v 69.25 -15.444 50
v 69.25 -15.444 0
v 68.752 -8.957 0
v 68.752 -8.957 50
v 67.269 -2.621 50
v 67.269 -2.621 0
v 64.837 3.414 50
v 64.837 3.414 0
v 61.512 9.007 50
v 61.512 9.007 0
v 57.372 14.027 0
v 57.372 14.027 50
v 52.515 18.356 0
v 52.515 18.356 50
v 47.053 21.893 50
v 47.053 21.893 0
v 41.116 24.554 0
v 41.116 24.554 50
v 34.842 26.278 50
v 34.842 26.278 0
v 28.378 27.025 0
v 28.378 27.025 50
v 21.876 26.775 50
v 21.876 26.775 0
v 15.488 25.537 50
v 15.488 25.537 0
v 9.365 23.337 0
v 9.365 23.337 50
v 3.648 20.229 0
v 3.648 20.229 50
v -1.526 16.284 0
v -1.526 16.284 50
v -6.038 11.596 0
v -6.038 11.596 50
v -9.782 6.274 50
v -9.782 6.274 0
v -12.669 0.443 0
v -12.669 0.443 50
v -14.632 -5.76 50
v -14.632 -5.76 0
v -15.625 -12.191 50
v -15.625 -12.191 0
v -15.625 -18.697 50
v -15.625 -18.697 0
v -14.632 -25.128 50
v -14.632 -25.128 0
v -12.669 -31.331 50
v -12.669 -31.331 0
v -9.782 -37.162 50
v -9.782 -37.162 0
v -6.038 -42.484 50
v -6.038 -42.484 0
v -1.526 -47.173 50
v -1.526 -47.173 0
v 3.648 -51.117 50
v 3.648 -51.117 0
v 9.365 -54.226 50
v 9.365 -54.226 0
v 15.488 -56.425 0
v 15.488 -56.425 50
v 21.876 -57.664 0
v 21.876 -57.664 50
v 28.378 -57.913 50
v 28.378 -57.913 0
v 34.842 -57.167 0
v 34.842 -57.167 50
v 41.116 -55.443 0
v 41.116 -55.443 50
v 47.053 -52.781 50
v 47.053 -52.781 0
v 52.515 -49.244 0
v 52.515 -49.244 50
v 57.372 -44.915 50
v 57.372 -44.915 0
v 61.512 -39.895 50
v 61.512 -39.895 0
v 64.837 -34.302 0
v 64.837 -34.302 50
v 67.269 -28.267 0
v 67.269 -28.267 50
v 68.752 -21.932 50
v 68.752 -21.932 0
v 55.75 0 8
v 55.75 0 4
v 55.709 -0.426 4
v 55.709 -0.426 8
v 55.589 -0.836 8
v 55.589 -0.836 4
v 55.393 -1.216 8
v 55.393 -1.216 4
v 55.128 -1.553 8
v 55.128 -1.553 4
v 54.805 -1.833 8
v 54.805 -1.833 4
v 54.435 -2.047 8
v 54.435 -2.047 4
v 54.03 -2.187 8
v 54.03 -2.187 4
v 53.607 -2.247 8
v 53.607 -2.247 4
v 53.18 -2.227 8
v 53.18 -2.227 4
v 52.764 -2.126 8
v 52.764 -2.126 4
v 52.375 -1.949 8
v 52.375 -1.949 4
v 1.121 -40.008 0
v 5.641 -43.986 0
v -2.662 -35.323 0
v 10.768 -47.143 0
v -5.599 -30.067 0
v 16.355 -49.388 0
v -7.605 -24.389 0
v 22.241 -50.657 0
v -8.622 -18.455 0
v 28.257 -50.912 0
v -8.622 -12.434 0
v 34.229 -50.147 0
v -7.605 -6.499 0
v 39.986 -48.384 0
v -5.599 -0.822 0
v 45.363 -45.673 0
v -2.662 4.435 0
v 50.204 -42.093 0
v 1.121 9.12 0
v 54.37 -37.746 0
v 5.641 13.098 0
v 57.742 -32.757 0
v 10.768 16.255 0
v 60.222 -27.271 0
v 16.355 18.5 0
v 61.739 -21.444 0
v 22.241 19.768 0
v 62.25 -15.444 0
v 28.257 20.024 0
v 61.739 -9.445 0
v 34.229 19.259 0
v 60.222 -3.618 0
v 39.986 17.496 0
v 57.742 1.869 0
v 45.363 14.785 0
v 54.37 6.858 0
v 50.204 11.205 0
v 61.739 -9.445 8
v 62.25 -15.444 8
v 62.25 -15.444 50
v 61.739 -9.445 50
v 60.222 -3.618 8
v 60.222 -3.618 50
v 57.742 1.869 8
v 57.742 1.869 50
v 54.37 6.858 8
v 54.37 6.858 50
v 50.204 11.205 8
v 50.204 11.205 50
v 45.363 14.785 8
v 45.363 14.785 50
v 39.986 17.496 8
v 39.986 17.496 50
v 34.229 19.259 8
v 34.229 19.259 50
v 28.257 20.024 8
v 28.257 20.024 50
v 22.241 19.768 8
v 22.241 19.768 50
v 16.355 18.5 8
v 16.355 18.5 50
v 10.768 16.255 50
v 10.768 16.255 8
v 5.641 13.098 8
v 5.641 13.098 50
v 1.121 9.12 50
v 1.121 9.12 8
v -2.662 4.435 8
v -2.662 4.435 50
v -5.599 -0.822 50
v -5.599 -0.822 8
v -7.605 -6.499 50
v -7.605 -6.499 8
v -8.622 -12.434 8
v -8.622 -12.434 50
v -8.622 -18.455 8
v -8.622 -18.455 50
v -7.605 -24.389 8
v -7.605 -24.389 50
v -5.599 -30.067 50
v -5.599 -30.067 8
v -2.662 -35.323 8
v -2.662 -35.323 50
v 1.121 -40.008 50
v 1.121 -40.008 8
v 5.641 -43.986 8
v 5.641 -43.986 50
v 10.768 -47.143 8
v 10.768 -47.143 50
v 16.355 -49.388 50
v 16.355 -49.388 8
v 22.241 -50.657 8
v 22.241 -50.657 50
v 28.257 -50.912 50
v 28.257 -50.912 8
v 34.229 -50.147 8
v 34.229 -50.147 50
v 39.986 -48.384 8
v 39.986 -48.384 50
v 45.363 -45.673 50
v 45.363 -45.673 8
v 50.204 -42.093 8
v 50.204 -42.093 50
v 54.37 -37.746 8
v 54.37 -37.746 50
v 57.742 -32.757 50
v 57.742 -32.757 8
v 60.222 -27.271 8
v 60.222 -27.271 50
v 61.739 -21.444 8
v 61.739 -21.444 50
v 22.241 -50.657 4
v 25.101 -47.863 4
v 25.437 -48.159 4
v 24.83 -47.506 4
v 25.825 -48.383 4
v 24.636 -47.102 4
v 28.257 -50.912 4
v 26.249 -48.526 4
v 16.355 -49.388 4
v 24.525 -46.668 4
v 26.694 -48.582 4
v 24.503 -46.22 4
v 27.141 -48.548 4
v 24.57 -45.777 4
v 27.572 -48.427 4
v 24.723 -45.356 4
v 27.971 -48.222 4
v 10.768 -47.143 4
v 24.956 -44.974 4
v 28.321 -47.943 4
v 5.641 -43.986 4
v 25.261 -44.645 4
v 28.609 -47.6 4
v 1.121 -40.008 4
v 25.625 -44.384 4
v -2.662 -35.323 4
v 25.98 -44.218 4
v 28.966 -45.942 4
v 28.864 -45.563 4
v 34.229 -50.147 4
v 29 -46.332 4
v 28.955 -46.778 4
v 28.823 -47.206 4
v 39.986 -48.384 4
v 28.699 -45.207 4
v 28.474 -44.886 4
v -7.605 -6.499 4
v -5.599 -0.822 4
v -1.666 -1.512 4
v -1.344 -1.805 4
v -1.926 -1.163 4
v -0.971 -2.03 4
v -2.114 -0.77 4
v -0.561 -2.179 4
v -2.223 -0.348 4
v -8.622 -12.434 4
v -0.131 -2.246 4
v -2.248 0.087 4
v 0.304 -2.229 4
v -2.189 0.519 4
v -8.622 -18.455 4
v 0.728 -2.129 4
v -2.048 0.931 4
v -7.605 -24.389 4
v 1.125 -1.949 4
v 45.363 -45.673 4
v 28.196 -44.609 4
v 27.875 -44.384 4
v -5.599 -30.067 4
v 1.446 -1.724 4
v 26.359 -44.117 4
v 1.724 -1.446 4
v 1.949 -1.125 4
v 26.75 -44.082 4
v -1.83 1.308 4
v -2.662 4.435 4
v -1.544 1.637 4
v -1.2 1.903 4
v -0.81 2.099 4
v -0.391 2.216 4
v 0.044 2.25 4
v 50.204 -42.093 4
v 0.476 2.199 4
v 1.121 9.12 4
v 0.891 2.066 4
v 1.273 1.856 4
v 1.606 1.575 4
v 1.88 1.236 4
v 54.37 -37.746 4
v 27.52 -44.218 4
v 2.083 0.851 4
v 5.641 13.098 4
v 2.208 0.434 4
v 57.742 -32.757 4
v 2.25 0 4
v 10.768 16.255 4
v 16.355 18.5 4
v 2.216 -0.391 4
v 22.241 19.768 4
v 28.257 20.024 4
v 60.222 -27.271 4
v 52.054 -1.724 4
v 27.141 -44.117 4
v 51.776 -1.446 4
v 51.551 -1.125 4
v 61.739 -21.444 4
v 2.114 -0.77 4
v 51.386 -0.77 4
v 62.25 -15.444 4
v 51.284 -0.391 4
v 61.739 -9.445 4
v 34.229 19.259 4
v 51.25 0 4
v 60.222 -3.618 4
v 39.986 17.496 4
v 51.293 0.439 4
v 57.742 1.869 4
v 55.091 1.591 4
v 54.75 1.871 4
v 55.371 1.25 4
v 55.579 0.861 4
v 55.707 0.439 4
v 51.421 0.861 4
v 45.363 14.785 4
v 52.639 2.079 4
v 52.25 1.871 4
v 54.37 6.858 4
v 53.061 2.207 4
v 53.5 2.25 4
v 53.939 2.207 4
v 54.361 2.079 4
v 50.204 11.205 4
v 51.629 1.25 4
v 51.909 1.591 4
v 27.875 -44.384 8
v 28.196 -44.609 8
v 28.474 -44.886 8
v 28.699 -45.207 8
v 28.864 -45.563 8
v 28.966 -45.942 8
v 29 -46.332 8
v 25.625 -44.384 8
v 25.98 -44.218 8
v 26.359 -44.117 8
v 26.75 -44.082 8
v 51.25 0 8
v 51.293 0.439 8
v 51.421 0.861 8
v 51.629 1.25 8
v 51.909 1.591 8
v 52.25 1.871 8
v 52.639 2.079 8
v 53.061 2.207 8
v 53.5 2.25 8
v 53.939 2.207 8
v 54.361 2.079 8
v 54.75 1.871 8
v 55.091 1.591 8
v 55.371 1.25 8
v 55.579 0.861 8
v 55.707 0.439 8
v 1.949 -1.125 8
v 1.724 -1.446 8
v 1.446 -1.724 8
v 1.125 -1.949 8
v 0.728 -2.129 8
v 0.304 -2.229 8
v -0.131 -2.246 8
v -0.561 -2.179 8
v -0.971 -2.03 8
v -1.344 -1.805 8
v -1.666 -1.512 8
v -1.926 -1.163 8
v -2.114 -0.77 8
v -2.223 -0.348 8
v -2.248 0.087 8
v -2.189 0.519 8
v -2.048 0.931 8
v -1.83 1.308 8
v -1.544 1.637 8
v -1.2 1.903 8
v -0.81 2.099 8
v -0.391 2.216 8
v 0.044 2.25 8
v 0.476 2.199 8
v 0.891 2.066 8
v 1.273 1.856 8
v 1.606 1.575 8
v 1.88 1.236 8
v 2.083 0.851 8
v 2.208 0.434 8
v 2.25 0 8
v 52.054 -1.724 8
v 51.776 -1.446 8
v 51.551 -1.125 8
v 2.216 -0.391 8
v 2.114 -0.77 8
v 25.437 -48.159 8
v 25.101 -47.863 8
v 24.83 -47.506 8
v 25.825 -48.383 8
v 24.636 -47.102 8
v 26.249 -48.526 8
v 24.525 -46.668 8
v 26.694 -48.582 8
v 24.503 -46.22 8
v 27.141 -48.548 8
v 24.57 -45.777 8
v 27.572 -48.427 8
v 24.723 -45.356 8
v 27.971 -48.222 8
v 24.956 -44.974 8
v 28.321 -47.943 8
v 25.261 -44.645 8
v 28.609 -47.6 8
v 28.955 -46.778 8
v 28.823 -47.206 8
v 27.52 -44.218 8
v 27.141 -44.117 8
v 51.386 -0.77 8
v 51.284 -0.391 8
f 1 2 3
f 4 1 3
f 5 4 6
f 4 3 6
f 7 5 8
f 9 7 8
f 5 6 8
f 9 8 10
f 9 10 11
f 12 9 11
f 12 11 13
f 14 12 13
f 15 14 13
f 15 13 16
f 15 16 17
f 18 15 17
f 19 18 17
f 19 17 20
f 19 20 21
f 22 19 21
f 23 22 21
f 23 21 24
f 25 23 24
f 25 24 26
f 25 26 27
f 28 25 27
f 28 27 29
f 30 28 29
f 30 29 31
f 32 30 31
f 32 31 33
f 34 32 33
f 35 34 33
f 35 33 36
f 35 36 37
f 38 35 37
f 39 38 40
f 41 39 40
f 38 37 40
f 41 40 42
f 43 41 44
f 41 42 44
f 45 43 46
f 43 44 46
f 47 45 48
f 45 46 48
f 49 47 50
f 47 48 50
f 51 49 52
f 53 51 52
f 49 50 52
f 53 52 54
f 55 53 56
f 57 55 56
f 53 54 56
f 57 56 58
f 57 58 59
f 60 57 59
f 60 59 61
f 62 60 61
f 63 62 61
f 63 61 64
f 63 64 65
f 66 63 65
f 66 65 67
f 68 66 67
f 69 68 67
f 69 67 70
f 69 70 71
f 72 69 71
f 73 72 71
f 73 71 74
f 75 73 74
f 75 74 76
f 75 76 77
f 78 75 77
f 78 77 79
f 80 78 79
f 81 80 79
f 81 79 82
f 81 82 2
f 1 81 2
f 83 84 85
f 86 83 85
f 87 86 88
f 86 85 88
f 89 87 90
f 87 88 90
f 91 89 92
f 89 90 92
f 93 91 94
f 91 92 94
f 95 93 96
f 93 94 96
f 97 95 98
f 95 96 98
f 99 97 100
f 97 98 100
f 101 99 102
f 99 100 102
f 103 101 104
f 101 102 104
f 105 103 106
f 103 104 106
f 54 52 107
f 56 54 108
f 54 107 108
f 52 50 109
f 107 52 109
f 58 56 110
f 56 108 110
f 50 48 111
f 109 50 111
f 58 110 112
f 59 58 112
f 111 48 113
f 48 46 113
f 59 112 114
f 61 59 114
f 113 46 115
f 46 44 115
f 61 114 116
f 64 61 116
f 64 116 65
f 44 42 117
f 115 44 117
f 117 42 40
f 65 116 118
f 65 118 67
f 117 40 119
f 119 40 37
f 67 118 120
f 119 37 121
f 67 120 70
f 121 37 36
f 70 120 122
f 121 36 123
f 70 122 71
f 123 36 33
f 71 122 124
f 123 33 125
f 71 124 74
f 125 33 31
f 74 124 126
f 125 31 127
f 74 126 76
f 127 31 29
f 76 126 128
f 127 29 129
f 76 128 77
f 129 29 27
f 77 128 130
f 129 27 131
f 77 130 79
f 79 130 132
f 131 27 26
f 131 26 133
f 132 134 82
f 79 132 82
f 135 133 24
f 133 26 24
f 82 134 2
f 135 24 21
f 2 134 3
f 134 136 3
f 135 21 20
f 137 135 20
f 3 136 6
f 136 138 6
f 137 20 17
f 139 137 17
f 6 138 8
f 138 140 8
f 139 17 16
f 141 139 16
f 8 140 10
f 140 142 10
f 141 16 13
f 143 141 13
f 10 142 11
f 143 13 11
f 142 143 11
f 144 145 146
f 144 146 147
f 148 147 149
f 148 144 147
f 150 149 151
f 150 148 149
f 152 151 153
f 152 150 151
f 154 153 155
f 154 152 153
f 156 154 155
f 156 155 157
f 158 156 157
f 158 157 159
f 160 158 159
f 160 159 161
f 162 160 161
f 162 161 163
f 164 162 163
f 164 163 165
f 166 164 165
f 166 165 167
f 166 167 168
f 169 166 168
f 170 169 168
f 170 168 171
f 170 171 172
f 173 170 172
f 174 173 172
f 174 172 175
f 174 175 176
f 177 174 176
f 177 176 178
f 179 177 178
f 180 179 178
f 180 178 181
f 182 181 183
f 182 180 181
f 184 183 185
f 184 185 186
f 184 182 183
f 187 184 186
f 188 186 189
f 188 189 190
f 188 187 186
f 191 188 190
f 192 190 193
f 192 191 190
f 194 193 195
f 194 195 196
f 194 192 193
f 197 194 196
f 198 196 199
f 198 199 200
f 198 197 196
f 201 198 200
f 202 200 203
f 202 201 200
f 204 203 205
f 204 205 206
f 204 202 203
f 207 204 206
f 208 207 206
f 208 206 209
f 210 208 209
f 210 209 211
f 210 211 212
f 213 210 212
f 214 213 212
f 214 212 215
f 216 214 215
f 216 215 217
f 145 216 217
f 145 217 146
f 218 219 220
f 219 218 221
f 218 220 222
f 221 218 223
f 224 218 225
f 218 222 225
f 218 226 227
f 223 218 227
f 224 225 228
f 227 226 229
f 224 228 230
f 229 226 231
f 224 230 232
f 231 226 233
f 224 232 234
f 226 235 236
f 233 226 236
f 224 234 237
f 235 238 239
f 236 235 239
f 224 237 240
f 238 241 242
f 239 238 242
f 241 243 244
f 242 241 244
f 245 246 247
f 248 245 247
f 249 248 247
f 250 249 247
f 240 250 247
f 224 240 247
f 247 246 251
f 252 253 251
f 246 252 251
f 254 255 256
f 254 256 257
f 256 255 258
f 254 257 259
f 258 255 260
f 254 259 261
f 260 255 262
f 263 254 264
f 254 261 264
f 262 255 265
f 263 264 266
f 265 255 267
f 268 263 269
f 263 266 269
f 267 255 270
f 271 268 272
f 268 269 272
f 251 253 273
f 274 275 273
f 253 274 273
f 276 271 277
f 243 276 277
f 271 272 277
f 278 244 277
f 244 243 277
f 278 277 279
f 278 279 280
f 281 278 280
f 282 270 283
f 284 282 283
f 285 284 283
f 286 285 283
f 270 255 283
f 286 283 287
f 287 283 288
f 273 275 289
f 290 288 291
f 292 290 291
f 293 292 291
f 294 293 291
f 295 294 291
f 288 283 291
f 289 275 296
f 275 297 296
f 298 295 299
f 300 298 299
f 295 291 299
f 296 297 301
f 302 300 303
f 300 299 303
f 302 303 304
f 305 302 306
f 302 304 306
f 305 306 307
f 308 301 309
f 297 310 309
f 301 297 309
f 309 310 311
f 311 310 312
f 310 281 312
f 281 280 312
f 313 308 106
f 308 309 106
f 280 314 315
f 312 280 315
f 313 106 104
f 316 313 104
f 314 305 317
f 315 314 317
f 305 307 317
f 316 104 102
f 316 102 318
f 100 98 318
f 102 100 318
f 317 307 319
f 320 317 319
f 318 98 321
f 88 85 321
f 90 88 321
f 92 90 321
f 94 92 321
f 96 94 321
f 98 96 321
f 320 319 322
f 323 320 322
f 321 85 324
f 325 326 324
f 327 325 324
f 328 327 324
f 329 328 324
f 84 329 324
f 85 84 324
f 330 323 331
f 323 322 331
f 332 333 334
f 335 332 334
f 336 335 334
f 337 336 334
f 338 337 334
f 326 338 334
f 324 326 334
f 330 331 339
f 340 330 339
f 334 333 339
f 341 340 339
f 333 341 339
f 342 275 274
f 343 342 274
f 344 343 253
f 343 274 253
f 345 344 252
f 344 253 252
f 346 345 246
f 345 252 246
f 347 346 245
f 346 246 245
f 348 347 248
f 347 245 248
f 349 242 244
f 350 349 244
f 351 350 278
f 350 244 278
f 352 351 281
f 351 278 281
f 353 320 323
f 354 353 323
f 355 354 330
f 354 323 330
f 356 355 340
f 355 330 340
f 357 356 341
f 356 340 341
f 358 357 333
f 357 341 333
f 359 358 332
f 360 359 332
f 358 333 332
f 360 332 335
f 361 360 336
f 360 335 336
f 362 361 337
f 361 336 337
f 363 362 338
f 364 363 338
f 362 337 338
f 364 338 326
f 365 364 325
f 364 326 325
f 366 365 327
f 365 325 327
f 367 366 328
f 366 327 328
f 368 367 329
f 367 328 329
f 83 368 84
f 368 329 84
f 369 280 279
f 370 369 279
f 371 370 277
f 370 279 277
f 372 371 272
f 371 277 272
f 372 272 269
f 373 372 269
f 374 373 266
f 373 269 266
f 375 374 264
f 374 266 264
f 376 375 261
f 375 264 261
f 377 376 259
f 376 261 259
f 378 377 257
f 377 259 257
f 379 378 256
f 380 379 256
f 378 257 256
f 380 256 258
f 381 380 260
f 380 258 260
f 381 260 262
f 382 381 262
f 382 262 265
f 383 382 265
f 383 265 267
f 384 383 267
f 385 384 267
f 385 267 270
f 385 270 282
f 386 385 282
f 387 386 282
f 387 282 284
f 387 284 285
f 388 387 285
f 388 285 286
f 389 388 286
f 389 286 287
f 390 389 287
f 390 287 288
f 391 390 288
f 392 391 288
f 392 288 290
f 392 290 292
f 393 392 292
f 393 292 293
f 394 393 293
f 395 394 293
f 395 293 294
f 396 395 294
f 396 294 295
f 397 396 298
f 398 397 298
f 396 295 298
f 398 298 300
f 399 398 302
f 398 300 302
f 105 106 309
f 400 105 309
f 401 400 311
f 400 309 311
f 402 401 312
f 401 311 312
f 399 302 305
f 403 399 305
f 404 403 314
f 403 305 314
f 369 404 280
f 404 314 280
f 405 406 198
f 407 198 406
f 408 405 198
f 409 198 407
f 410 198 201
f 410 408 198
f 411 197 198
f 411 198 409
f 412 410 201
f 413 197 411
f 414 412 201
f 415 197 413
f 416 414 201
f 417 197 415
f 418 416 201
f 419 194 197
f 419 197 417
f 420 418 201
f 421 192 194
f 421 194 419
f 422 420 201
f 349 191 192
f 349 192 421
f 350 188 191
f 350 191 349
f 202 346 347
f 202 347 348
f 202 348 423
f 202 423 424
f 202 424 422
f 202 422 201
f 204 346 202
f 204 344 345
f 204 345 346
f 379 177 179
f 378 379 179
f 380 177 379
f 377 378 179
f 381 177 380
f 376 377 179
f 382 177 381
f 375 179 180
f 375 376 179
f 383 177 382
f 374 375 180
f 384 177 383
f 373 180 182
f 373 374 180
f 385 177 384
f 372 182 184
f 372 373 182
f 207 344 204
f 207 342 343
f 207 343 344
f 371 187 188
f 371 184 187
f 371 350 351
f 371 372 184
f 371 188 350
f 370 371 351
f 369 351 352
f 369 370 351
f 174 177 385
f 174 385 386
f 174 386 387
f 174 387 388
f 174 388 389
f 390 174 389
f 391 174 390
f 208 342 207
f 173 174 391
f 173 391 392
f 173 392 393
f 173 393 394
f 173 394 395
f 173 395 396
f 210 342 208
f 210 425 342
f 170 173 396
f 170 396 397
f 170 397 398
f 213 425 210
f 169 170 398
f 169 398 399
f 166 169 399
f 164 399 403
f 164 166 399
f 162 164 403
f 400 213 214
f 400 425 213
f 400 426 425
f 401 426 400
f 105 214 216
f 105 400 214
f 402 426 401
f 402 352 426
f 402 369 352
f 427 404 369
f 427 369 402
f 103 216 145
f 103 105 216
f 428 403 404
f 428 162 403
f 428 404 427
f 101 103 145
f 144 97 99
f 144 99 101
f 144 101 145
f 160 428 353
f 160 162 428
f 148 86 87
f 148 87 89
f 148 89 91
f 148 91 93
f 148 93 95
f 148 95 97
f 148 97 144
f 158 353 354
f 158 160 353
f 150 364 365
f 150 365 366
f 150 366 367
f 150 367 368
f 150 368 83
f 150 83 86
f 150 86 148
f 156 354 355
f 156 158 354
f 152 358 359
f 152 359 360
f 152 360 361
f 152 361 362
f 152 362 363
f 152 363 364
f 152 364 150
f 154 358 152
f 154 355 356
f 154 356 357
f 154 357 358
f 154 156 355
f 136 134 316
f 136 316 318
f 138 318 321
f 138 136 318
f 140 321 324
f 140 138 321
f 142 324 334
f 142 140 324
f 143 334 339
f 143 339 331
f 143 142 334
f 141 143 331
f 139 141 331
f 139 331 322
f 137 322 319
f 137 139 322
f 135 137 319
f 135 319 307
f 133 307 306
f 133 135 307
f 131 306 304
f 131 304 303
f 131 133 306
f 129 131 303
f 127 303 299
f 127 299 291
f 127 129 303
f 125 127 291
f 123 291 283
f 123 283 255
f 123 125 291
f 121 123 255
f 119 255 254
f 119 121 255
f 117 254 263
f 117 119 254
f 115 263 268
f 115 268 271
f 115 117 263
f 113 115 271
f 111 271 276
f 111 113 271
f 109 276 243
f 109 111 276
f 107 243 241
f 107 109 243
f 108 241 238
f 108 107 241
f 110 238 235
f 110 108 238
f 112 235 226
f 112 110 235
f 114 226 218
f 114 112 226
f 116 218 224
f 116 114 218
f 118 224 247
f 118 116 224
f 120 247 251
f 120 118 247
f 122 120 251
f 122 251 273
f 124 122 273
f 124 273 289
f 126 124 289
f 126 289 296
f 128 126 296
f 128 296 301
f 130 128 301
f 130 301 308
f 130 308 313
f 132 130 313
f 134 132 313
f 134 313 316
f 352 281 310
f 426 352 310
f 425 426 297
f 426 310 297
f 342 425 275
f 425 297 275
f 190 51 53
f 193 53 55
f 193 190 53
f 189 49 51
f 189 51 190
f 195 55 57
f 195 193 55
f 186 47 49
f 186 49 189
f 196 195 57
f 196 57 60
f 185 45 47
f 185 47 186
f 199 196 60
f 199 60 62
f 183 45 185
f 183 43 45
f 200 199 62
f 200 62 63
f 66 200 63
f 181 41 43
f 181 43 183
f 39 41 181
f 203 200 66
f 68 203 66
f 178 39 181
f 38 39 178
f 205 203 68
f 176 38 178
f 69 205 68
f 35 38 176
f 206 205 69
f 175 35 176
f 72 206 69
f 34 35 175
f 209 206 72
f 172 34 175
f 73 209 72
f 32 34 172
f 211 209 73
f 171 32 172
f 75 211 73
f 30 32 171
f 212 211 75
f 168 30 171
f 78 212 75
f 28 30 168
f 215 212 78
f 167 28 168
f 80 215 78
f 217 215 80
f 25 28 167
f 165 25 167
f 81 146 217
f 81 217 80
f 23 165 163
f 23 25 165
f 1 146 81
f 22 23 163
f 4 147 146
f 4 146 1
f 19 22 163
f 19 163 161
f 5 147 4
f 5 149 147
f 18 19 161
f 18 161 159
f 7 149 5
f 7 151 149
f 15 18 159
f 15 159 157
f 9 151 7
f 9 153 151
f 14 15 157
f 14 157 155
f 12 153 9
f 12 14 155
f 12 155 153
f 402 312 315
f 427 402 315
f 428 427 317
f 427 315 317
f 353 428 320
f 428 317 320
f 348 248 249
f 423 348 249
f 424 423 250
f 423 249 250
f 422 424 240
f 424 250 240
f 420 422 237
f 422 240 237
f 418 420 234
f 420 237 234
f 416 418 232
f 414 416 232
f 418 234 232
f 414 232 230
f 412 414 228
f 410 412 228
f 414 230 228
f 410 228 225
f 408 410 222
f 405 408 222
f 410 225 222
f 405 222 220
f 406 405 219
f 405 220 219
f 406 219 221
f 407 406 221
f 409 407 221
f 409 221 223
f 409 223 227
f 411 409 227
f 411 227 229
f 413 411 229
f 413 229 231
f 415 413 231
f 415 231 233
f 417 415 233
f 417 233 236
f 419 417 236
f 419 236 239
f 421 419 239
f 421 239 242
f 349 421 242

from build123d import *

# Parameters (mm, degrees)
F0_R     = 42.5
F0_R_2   = 35.5
F1_DEPTH = 8
F2_DEPTH = 50
F3_DEPTH = 4


with BuildPart() as f1:
    # F0 (on Top) → F1 (new body)
    with BuildSketch(Plane.XY):
        with Locations((26.75, -15.44412)):
            Circle(F0_R)
        with Locations((26.75, -15.44412)):
            Circle(F0_R_2, mode=Mode.SUBTRACT)
        with Locations((26.75, -15.44412)):
            Circle(F0_R_2)
        with BuildLine():
            ThreePointArc((1.125, -1.948557), (-1.948557, 1.125), (2.25, 0))
            Line((2.25, 0), (26.75, 0))
            Line((26.75, 0), (51.25, 0))
            ThreePointArc((51.25, 0), (53.5, 2.25), (55.75, 0))
            ThreePointArc((55.75, 0), (54.625, -1.948557), (52.375, -1.948557))
            Line((52.375, -1.948557), (40.125, -23.16618))
            Line((40.125, -23.16618), (27.875, -44.383802))
            ThreePointArc((27.875, -44.383802), (28.698557, -45.207359), (29, -46.332359))
            ThreePointArc((29, -46.332359), (25.625, -48.280916), (25.625, -44.383802))
            Line((25.625, -44.383802), (13.375, -23.16618))
            Line((13.375, -23.16618), (1.125, -1.948557))
        make_face(mode=Mode.SUBTRACT)
        with BuildLine():
            Line((26.75, -15.44412), (13.375, -23.16618))
            Line((13.375, -23.16618), (25.625, -44.383802))
            ThreePointArc((25.625, -44.383802), (26.167657, -44.159026), (26.75, -44.082359))
            Line((26.75, -44.082359), (26.75, -15.44412))
        make_face()
        with BuildLine():
            ThreePointArc((1.948557, -1.125), (1.59099, -1.59099), (1.125, -1.948557))
            Line((1.125, -1.948557), (13.375, -23.16618))
            Line((13.375, -23.16618), (26.75, -15.44412))
            Line((26.75, -15.44412), (1.948557, -1.125))
        make_face()
        with BuildLine():
            Line((51.551443, -1.125), (26.75, -15.44412))
            Line((26.75, -15.44412), (40.125, -23.16618))
            Line((40.125, -23.16618), (52.375, -1.948557))
            ThreePointArc((52.375, -1.948557), (51.90901, -1.59099), (51.551443, -1.125))
        make_face()
        with BuildLine():
            Line((51.25, 0), (26.75, 0))
            Line((26.75, 0), (26.75, -15.44412))
            Line((26.75, -15.44412), (51.551443, -1.125))
            ThreePointArc((51.551443, -1.125), (51.326667, -0.582343), (51.25, 0))
        make_face()
        with BuildLine():
            Line((40.125, -23.16618), (26.75, -15.44412))
            Line((26.75, -15.44412), (26.75, -44.082359))
            ThreePointArc((26.75, -44.082359), (27.332343, -44.159026), (27.875, -44.383802))
            Line((27.875, -44.383802), (40.125, -23.16618))
        make_face()
        with BuildLine():
            Line((26.75, 0), (2.25, 0))
            ThreePointArc((2.25, 0), (2.173333, -0.582343), (1.948557, -1.125))
            Line((1.948557, -1.125), (26.75, -15.44412))
            Line((26.75, -15.44412), (26.75, 0))
        make_face()
    extrude(amount=F1_DEPTH)

    # F0 (on Top) → F2 (join)
    with BuildSketch(Plane.XY):
        with Locations((26.75, -15.44412)):
            Circle(F0_R)
        with Locations((26.75, -15.44412)):
            Circle(F0_R_2, mode=Mode.SUBTRACT)
    extrude(amount=F2_DEPTH)

    # F0 (on Top) → F3 (cut)
    with BuildSketch(Plane.XY):
        with Locations((26.75, -15.44412)):
            Circle(F0_R_2)
        with BuildLine():
            ThreePointArc((1.125, -1.948557), (-1.948557, 1.125), (2.25, 0))
            Line((2.25, 0), (26.75, 0))
            Line((26.75, 0), (51.25, 0))
            ThreePointArc((51.25, 0), (53.5, 2.25), (55.75, 0))
            ThreePointArc((55.75, 0), (54.625, -1.948557), (52.375, -1.948557))
            Line((52.375, -1.948557), (40.125, -23.16618))
            Line((40.125, -23.16618), (27.875, -44.383802))
            ThreePointArc((27.875, -44.383802), (28.698557, -45.207359), (29, -46.332359))
            ThreePointArc((29, -46.332359), (25.625, -48.280916), (25.625, -44.383802))
            Line((25.625, -44.383802), (13.375, -23.16618))
            Line((13.375, -23.16618), (1.125, -1.948557))
        make_face(mode=Mode.SUBTRACT)
        with BuildLine():
            Line((26.75, 0), (2.25, 0))
            ThreePointArc((2.25, 0), (2.173333, -0.582343), (1.948557, -1.125))
            Line((1.948557, -1.125), (26.75, -15.44412))
            Line((26.75, -15.44412), (26.75, 0))
        make_face()
        with BuildLine():
            Line((51.25, 0), (26.75, 0))
            Line((26.75, 0), (26.75, -15.44412))
            Line((26.75, -15.44412), (51.551443, -1.125))
            ThreePointArc((51.551443, -1.125), (51.326667, -0.582343), (51.25, 0))
        make_face()
        with BuildLine():
            Line((26.75, -15.44412), (13.375, -23.16618))
            Line((13.375, -23.16618), (25.625, -44.383802))
            ThreePointArc((25.625, -44.383802), (26.167657, -44.159026), (26.75, -44.082359))
            Line((26.75, -44.082359), (26.75, -15.44412))
        make_face()
        with BuildLine():
            ThreePointArc((1.948557, -1.125), (1.59099, -1.59099), (1.125, -1.948557))
            Line((1.125, -1.948557), (13.375, -23.16618))
            Line((13.375, -23.16618), (26.75, -15.44412))
            Line((26.75, -15.44412), (1.948557, -1.125))
        make_face()
        with BuildLine():
            Line((51.551443, -1.125), (26.75, -15.44412))
            Line((26.75, -15.44412), (40.125, -23.16618))
            Line((40.125, -23.16618), (52.375, -1.948557))
            ThreePointArc((52.375, -1.948557), (51.90901, -1.59099), (51.551443, -1.125))
        make_face()
        with BuildLine():
            Line((40.125, -23.16618), (26.75, -15.44412))
            Line((26.75, -15.44412), (26.75, -44.082359))
            ThreePointArc((26.75, -44.082359), (27.332343, -44.159026), (27.875, -44.383802))
            Line((27.875, -44.383802), (40.125, -23.16618))
        make_face()
    extrude(amount=F3_DEPTH, mode=Mode.SUBTRACT)


solid = f1.part
